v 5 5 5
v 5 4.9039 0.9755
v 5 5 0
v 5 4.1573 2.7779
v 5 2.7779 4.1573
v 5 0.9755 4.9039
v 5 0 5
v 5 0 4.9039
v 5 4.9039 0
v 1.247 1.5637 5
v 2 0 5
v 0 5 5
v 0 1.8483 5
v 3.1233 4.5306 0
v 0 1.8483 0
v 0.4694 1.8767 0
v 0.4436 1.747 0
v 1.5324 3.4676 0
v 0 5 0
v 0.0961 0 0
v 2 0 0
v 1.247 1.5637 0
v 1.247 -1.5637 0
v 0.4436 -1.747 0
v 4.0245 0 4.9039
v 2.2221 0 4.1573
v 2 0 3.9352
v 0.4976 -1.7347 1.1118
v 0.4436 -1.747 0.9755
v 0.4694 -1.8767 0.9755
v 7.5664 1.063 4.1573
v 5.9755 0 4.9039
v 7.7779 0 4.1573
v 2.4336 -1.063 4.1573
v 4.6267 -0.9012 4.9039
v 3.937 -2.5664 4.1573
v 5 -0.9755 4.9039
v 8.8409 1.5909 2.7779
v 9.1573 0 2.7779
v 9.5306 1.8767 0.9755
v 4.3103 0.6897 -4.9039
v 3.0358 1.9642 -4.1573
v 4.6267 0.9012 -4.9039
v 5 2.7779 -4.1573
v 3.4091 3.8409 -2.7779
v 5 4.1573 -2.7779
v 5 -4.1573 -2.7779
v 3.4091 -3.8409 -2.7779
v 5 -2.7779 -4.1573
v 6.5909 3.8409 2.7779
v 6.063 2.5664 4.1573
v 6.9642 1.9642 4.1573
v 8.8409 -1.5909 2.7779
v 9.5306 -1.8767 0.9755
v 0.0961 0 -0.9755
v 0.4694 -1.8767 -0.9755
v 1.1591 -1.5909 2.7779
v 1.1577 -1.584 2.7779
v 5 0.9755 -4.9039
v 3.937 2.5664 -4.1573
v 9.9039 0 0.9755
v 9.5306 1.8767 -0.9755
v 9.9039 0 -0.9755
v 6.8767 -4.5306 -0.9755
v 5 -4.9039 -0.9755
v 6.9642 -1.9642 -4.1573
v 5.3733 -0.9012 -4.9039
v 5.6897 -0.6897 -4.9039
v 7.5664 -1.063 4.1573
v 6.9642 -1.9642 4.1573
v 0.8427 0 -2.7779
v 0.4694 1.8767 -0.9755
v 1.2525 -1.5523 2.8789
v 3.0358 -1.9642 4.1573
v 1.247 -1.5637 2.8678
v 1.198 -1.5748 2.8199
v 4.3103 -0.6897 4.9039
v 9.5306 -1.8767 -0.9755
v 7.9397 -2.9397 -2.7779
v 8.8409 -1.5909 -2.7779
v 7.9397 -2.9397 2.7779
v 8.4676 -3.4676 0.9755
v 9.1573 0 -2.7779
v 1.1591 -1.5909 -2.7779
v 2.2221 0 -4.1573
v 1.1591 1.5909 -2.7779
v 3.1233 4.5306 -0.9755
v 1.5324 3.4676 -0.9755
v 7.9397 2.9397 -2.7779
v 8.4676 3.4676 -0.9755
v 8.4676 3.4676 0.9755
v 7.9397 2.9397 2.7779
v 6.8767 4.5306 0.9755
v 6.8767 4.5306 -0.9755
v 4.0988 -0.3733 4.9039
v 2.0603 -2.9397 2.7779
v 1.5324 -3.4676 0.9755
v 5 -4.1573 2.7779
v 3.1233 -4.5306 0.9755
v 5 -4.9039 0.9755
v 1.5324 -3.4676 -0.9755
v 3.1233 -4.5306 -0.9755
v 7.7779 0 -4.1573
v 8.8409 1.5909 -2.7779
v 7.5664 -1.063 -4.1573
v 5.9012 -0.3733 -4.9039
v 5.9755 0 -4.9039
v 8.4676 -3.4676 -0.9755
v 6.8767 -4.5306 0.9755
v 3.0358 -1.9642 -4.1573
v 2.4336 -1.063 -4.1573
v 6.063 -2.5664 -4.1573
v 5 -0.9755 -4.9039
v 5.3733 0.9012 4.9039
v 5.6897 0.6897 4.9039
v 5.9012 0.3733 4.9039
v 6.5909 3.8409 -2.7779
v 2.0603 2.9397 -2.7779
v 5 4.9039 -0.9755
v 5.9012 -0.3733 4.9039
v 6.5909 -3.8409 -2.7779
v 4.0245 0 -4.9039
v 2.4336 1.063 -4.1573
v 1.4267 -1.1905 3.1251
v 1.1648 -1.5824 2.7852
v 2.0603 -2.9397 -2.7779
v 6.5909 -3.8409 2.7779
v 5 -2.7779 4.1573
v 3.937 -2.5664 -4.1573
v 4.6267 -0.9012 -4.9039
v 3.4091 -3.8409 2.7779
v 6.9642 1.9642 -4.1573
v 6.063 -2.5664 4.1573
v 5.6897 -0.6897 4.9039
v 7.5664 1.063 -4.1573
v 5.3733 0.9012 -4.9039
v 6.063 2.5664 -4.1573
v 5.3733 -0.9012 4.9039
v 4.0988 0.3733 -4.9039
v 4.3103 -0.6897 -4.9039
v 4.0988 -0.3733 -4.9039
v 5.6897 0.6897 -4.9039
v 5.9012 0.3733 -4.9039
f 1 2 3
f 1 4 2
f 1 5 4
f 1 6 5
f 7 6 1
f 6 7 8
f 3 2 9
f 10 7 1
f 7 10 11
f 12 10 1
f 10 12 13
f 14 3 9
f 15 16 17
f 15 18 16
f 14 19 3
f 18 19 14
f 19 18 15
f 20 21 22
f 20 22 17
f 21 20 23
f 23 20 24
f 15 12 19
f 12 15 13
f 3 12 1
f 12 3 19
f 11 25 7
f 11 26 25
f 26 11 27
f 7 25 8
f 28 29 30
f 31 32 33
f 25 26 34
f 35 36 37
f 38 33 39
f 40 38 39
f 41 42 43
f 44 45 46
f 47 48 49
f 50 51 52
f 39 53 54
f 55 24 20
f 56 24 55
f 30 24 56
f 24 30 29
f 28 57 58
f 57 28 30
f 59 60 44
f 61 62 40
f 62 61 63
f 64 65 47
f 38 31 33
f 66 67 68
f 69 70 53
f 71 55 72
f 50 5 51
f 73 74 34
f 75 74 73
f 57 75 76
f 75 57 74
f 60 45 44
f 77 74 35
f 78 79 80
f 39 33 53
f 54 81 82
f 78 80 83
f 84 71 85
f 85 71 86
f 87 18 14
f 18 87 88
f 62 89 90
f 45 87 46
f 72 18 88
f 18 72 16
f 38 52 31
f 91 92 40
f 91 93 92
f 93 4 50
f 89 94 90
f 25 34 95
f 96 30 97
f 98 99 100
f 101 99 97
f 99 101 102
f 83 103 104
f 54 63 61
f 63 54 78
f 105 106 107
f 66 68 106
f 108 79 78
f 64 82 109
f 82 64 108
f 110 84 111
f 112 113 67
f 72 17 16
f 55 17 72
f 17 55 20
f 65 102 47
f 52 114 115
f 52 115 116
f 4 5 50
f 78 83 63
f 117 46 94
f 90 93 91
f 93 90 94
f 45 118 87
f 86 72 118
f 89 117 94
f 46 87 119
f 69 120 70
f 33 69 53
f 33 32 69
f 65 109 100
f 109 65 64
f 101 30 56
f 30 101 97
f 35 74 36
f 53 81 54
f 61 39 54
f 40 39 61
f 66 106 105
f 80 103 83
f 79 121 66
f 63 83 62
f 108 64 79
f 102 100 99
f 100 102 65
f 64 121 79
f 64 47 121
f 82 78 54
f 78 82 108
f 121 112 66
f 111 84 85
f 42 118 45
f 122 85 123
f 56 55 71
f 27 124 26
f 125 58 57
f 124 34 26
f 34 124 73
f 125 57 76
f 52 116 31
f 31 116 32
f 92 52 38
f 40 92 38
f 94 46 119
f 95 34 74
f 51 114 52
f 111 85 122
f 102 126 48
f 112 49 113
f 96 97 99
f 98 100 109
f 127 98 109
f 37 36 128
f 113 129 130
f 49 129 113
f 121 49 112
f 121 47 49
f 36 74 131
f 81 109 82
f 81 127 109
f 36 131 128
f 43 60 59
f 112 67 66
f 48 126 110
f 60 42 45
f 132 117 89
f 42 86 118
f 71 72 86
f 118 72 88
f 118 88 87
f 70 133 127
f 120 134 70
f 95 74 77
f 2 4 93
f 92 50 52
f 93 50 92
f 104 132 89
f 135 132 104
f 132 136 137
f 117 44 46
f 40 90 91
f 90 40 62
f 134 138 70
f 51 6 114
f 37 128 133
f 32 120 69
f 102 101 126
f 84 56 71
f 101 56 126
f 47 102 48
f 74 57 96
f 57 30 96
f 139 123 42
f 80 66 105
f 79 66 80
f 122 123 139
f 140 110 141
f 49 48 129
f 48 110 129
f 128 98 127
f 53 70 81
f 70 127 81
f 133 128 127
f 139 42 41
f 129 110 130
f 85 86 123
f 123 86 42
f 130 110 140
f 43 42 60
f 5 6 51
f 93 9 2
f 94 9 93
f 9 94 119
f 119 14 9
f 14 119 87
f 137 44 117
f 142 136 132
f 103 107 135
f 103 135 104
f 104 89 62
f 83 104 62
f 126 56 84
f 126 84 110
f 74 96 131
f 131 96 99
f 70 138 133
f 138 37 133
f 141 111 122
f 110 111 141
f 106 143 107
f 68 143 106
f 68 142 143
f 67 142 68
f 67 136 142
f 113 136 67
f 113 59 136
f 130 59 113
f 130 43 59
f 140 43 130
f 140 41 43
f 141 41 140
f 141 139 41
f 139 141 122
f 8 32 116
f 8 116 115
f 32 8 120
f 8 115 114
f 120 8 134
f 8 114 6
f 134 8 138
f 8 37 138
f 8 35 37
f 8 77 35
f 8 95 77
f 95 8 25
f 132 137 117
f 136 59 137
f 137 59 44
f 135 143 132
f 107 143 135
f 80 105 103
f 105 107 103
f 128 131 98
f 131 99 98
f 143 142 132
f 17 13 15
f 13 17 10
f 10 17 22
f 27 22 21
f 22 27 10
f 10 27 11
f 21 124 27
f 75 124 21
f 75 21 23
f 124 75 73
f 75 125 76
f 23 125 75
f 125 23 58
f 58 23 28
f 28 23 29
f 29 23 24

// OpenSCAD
// Generated by SolidPython 1.1.3 on 2022-04-22 13:44:22


difference() {
	union() {
		cube(size = 5);
		translate(v = [5, 0, 0]) {
			sphere(r = 5);
		}
	}
	cylinder(h = 6, r = 2);
}
/***********************************************
*********      SolidPython code:      **********
************************************************
 
from solid import *
from solid.utils import *
import viewscad


d = cube(5) + right(5)(sphere(5)) - cylinder(r=2, h=6)

a = difference()(
    cube(100),  # Note the comma between each element!
    sphere(150),
    cylinder(50)
)
scad_render_to_file(a,'test_a.scad')
renderer = viewscad.Renderer(openscad_exec='./test_a.scad')
scad_render_to_file(d,'test_d.scad')
renderer = viewscad.Renderer(openscad_exec='./test_d.scad')
 
 
************************************************/
